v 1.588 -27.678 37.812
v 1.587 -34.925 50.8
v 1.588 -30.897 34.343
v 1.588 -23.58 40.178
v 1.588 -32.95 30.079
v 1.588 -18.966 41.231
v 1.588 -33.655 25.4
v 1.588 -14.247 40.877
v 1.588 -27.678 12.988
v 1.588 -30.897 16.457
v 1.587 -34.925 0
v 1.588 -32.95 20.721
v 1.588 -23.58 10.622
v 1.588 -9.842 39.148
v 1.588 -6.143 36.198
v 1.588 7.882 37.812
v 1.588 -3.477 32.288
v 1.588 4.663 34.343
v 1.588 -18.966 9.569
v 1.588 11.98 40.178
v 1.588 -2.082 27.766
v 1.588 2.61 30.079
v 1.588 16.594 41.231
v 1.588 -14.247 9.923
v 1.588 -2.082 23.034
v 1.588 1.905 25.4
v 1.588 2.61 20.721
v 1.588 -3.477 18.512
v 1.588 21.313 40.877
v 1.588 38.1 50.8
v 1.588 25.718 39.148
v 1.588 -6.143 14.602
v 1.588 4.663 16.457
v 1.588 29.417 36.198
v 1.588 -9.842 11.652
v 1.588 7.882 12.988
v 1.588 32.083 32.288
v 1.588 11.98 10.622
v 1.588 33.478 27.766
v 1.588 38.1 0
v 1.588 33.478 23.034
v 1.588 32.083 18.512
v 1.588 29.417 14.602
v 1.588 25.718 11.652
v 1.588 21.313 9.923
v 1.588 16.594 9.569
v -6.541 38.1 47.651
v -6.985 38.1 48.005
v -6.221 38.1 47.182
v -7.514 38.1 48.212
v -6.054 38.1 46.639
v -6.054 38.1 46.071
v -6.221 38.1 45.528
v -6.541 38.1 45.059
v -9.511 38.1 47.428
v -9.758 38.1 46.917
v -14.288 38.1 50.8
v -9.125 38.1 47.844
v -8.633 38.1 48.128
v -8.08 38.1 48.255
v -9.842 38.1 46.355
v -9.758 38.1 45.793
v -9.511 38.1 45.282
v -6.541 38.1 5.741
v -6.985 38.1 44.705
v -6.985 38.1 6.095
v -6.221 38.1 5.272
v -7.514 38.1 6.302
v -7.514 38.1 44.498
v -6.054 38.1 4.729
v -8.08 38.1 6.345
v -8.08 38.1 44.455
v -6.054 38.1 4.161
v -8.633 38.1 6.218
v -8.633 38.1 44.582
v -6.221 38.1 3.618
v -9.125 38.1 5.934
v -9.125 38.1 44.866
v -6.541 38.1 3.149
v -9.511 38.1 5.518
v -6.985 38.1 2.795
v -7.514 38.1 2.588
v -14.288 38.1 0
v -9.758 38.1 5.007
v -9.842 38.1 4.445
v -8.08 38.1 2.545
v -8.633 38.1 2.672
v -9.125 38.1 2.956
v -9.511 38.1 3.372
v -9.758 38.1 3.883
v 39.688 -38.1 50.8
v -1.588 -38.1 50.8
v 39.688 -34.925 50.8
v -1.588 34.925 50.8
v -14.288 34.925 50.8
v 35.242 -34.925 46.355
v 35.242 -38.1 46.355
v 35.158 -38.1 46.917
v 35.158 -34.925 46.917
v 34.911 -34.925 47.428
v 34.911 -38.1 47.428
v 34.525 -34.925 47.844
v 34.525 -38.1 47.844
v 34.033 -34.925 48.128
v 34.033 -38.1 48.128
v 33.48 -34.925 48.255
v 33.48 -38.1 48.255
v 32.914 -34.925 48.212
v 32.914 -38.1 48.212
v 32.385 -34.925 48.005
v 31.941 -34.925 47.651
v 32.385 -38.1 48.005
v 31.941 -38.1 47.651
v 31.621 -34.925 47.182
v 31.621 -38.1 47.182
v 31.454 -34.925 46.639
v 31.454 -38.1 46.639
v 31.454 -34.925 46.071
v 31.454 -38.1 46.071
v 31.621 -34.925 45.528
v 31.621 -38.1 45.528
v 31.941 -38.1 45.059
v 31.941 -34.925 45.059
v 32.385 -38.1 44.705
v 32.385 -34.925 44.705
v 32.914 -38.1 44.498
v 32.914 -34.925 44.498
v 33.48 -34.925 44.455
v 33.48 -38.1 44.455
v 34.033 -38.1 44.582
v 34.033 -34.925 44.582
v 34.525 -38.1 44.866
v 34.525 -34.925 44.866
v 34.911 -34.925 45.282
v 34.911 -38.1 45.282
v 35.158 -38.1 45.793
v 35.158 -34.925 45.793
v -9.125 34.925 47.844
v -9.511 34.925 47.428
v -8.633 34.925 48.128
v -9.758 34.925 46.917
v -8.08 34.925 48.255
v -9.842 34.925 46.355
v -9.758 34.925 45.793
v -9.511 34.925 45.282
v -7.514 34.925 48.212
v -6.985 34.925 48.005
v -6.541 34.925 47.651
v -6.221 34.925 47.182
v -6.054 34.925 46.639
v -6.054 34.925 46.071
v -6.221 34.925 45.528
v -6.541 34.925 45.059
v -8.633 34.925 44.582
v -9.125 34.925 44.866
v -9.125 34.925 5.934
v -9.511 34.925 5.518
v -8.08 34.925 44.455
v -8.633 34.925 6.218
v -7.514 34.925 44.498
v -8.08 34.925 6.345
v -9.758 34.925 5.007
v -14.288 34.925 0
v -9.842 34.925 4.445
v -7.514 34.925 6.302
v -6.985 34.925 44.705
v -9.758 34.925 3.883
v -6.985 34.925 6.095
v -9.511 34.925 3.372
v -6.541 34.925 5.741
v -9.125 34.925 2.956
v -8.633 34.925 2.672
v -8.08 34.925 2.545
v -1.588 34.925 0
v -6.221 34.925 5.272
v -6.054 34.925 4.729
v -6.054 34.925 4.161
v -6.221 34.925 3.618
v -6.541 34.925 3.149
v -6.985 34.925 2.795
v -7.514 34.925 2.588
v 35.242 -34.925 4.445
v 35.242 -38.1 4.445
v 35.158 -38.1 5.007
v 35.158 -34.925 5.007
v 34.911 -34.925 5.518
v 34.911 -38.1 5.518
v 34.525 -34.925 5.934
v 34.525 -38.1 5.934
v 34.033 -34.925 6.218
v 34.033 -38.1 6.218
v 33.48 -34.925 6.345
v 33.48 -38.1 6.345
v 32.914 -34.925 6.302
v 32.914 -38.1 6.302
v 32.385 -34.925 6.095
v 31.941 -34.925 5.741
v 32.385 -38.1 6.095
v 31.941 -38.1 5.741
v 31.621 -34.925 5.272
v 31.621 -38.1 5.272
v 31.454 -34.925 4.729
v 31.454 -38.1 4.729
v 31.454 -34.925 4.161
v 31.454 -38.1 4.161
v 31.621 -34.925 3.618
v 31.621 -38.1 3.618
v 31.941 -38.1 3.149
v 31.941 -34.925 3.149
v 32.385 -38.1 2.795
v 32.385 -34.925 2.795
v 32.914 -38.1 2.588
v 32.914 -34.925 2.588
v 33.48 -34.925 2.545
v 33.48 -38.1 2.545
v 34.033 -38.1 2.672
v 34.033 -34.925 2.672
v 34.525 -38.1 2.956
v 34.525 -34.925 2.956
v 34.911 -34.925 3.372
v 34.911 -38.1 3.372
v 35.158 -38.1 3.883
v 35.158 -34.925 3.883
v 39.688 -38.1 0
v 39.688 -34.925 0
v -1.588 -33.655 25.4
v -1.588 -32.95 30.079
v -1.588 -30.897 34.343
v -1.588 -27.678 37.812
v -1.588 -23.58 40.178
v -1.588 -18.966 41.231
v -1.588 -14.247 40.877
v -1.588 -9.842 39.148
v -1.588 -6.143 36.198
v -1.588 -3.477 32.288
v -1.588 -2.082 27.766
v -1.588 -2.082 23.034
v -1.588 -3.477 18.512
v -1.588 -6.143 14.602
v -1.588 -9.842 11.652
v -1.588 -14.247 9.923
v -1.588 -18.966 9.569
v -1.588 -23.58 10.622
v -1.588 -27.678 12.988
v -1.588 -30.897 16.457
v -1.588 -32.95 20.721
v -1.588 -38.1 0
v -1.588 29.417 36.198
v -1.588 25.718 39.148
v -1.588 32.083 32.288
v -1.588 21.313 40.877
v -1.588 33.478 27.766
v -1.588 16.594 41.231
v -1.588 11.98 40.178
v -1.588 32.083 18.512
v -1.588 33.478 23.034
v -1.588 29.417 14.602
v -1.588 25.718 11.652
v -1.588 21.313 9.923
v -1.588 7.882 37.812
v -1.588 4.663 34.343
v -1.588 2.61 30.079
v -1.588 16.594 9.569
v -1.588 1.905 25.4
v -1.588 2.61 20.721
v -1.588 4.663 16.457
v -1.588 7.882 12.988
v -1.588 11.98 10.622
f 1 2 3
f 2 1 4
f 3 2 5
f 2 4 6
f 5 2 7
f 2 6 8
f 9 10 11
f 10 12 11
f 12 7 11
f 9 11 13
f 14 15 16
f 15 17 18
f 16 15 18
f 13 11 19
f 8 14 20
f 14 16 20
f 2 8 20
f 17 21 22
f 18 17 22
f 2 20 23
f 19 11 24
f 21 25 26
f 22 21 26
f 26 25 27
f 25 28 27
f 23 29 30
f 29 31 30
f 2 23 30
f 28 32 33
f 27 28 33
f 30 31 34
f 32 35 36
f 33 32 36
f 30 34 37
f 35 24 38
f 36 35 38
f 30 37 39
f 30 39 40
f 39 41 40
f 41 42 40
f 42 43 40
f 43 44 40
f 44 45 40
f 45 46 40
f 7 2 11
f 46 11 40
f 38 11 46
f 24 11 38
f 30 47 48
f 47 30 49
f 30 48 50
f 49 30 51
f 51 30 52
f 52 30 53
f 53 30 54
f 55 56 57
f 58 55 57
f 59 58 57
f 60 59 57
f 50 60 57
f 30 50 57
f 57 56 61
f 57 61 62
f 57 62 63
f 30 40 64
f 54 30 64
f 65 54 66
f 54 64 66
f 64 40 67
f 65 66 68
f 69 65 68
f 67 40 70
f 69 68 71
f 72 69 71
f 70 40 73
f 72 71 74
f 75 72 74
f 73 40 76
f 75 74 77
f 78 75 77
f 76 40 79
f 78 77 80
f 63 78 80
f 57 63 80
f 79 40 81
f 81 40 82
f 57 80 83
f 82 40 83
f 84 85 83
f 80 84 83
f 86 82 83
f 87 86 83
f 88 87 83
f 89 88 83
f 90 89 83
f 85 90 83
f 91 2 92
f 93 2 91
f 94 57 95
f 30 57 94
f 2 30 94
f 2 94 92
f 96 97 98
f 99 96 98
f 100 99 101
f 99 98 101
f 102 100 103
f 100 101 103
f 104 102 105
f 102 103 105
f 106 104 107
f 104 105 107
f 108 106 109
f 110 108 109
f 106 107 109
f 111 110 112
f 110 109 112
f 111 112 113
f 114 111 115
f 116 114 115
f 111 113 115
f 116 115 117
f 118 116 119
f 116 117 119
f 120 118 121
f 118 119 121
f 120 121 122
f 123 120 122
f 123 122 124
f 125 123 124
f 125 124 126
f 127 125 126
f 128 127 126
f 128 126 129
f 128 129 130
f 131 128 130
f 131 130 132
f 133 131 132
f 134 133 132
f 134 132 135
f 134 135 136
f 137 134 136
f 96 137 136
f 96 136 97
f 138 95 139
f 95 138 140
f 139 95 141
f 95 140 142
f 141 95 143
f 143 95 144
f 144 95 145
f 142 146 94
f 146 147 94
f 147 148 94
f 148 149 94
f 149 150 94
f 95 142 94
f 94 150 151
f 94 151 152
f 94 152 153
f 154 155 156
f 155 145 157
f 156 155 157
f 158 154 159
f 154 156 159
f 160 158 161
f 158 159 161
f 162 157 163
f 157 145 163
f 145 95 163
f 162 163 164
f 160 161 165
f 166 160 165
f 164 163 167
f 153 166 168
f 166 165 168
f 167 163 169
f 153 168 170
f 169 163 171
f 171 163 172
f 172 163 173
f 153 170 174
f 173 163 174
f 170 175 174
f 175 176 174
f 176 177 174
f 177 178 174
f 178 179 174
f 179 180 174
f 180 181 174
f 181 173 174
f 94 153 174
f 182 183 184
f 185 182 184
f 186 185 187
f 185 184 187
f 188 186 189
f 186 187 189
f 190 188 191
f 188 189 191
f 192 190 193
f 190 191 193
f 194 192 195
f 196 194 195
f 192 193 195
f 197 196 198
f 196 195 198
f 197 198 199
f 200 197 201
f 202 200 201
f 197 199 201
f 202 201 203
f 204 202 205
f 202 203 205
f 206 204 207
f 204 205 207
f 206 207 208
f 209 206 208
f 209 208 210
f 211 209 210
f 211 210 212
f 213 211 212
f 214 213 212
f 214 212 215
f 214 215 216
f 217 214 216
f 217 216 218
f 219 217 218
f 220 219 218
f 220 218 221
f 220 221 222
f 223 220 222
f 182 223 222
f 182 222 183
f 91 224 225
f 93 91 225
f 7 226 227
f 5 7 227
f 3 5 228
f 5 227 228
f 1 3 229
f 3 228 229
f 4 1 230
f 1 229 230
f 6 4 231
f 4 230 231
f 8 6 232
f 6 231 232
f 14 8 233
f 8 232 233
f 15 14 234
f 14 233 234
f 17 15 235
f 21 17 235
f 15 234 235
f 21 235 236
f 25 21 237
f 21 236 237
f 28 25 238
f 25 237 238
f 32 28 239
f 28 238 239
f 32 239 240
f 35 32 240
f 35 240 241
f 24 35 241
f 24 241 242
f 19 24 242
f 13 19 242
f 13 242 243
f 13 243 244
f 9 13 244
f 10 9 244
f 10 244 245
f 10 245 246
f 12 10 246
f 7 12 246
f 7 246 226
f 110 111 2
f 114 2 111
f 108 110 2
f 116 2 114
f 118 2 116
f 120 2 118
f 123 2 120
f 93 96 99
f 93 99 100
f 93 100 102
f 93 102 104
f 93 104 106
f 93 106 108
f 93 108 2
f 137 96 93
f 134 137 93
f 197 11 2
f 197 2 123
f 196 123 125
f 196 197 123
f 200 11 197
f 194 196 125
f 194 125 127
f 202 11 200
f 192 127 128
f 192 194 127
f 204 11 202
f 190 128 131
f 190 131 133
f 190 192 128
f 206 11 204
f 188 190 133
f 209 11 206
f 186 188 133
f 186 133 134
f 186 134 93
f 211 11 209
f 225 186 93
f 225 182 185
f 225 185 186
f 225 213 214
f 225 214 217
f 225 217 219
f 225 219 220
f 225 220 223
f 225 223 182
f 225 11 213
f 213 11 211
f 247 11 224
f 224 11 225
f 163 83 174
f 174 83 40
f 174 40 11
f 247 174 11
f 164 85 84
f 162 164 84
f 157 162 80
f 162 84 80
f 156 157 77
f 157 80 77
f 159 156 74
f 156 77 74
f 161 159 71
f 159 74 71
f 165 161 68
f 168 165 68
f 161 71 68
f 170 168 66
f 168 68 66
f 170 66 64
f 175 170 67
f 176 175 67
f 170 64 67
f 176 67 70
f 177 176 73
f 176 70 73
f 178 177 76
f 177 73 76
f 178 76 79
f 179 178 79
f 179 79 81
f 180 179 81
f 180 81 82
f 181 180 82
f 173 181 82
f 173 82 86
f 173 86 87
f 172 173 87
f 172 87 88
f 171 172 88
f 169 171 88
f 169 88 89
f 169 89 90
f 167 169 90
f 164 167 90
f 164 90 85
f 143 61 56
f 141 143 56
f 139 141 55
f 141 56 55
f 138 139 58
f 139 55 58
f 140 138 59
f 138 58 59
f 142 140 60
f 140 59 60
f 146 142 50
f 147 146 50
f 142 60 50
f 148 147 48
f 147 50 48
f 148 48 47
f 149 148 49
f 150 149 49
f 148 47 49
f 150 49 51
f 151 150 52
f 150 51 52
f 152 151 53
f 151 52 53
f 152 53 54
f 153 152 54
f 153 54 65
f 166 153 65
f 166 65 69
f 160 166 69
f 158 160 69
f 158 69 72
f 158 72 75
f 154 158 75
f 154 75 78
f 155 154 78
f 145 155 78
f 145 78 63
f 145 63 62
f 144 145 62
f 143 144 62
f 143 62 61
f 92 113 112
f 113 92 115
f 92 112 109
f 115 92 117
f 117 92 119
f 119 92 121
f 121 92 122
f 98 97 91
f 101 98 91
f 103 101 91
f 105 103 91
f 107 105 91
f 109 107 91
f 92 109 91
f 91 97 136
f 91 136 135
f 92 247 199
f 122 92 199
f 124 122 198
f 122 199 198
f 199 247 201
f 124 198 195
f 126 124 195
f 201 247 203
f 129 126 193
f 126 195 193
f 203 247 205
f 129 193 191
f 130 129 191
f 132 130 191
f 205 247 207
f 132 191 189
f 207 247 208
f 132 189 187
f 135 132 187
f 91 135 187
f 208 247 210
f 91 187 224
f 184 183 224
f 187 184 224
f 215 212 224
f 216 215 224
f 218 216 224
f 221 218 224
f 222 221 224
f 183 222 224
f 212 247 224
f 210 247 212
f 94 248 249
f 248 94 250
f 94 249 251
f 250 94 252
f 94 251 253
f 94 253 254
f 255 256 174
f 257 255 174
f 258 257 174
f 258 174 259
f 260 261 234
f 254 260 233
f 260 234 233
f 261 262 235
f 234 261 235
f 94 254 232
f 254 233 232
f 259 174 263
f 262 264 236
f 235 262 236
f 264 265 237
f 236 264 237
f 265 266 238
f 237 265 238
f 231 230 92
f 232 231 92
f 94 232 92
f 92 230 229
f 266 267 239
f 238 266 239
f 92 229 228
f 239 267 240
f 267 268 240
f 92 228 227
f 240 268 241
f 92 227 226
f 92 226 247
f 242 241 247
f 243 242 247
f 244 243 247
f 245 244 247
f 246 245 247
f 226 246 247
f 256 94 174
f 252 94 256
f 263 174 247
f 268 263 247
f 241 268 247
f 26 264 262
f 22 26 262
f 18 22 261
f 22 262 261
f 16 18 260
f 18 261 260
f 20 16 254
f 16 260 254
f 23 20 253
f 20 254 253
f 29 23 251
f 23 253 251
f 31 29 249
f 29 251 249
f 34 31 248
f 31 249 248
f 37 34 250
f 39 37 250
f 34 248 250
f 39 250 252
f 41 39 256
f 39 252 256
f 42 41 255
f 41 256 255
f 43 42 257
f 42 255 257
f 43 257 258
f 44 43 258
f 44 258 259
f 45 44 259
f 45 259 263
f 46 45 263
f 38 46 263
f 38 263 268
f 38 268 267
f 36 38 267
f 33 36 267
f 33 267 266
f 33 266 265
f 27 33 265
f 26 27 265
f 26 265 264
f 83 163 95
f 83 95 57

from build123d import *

# Parameters (mm, degrees)
F0_W     = 38.1
F0_H     = 3.175
F0_W_2   = 12.7
F1_DEPTH = 50.8
F2_R     = 15.875
F3_DEPTH = 25.4
F4_R     = 1.905
F5_DEPTH = 25.4
F6_R     = 1.905
F7_DEPTH = 25.4


with BuildPart() as f1:
    # F0 (on Top) → F1 (new body)
    with BuildSketch(Plane.XY):
        with Locations((20.6375, -36.5125)):
            Rectangle(F0_W, F0_H)
        Polygon((-1.5875, -38.1), (1.5875, -38.1), (1.5875, -34.925), (1.5875, 38.1), (-1.5875, 38.1), (-1.5875, 34.925), align=None)
        with Locations((-7.9375, 36.5125)):
            Rectangle(F0_W_2, F0_H)
    extrude(amount=F1_DEPTH)

    # F2 (on face) → F3 (cut)
    with BuildSketch(Plane(origin=(-1.5875, 0, 0), x_dir=(0, -1, 0), z_dir=(-1, 0, 0))):
        with Locations((17.78, 25.4)):
            Circle(F2_R)
        with Locations((-17.78, 25.4)):
            Circle(F2_R)
    extrude(amount=-F3_DEPTH, mode=Mode.SUBTRACT)

    # F4 (on face) → F5 (cut)
    with BuildSketch(Plane.XZ.offset(38.1)):
        with Locations((33.3375, 46.355)):
            Circle(F4_R)
        with Locations((33.3375, 4.445)):
            Circle(F4_R)
    extrude(amount=-F5_DEPTH, mode=Mode.SUBTRACT)

    # F6 (on face) → F7 (cut)
    with BuildSketch(Plane(origin=(0, 38.1, 0), x_dir=(-1, 0, 0), z_dir=(0, 1, 0))):
        with Locations((7.9375, 4.445)):
            Circle(F6_R)
        with Locations((7.9375, 46.355)):
            Circle(F6_R)
    extrude(amount=-F7_DEPTH, mode=Mode.SUBTRACT)


solid = f1.part
